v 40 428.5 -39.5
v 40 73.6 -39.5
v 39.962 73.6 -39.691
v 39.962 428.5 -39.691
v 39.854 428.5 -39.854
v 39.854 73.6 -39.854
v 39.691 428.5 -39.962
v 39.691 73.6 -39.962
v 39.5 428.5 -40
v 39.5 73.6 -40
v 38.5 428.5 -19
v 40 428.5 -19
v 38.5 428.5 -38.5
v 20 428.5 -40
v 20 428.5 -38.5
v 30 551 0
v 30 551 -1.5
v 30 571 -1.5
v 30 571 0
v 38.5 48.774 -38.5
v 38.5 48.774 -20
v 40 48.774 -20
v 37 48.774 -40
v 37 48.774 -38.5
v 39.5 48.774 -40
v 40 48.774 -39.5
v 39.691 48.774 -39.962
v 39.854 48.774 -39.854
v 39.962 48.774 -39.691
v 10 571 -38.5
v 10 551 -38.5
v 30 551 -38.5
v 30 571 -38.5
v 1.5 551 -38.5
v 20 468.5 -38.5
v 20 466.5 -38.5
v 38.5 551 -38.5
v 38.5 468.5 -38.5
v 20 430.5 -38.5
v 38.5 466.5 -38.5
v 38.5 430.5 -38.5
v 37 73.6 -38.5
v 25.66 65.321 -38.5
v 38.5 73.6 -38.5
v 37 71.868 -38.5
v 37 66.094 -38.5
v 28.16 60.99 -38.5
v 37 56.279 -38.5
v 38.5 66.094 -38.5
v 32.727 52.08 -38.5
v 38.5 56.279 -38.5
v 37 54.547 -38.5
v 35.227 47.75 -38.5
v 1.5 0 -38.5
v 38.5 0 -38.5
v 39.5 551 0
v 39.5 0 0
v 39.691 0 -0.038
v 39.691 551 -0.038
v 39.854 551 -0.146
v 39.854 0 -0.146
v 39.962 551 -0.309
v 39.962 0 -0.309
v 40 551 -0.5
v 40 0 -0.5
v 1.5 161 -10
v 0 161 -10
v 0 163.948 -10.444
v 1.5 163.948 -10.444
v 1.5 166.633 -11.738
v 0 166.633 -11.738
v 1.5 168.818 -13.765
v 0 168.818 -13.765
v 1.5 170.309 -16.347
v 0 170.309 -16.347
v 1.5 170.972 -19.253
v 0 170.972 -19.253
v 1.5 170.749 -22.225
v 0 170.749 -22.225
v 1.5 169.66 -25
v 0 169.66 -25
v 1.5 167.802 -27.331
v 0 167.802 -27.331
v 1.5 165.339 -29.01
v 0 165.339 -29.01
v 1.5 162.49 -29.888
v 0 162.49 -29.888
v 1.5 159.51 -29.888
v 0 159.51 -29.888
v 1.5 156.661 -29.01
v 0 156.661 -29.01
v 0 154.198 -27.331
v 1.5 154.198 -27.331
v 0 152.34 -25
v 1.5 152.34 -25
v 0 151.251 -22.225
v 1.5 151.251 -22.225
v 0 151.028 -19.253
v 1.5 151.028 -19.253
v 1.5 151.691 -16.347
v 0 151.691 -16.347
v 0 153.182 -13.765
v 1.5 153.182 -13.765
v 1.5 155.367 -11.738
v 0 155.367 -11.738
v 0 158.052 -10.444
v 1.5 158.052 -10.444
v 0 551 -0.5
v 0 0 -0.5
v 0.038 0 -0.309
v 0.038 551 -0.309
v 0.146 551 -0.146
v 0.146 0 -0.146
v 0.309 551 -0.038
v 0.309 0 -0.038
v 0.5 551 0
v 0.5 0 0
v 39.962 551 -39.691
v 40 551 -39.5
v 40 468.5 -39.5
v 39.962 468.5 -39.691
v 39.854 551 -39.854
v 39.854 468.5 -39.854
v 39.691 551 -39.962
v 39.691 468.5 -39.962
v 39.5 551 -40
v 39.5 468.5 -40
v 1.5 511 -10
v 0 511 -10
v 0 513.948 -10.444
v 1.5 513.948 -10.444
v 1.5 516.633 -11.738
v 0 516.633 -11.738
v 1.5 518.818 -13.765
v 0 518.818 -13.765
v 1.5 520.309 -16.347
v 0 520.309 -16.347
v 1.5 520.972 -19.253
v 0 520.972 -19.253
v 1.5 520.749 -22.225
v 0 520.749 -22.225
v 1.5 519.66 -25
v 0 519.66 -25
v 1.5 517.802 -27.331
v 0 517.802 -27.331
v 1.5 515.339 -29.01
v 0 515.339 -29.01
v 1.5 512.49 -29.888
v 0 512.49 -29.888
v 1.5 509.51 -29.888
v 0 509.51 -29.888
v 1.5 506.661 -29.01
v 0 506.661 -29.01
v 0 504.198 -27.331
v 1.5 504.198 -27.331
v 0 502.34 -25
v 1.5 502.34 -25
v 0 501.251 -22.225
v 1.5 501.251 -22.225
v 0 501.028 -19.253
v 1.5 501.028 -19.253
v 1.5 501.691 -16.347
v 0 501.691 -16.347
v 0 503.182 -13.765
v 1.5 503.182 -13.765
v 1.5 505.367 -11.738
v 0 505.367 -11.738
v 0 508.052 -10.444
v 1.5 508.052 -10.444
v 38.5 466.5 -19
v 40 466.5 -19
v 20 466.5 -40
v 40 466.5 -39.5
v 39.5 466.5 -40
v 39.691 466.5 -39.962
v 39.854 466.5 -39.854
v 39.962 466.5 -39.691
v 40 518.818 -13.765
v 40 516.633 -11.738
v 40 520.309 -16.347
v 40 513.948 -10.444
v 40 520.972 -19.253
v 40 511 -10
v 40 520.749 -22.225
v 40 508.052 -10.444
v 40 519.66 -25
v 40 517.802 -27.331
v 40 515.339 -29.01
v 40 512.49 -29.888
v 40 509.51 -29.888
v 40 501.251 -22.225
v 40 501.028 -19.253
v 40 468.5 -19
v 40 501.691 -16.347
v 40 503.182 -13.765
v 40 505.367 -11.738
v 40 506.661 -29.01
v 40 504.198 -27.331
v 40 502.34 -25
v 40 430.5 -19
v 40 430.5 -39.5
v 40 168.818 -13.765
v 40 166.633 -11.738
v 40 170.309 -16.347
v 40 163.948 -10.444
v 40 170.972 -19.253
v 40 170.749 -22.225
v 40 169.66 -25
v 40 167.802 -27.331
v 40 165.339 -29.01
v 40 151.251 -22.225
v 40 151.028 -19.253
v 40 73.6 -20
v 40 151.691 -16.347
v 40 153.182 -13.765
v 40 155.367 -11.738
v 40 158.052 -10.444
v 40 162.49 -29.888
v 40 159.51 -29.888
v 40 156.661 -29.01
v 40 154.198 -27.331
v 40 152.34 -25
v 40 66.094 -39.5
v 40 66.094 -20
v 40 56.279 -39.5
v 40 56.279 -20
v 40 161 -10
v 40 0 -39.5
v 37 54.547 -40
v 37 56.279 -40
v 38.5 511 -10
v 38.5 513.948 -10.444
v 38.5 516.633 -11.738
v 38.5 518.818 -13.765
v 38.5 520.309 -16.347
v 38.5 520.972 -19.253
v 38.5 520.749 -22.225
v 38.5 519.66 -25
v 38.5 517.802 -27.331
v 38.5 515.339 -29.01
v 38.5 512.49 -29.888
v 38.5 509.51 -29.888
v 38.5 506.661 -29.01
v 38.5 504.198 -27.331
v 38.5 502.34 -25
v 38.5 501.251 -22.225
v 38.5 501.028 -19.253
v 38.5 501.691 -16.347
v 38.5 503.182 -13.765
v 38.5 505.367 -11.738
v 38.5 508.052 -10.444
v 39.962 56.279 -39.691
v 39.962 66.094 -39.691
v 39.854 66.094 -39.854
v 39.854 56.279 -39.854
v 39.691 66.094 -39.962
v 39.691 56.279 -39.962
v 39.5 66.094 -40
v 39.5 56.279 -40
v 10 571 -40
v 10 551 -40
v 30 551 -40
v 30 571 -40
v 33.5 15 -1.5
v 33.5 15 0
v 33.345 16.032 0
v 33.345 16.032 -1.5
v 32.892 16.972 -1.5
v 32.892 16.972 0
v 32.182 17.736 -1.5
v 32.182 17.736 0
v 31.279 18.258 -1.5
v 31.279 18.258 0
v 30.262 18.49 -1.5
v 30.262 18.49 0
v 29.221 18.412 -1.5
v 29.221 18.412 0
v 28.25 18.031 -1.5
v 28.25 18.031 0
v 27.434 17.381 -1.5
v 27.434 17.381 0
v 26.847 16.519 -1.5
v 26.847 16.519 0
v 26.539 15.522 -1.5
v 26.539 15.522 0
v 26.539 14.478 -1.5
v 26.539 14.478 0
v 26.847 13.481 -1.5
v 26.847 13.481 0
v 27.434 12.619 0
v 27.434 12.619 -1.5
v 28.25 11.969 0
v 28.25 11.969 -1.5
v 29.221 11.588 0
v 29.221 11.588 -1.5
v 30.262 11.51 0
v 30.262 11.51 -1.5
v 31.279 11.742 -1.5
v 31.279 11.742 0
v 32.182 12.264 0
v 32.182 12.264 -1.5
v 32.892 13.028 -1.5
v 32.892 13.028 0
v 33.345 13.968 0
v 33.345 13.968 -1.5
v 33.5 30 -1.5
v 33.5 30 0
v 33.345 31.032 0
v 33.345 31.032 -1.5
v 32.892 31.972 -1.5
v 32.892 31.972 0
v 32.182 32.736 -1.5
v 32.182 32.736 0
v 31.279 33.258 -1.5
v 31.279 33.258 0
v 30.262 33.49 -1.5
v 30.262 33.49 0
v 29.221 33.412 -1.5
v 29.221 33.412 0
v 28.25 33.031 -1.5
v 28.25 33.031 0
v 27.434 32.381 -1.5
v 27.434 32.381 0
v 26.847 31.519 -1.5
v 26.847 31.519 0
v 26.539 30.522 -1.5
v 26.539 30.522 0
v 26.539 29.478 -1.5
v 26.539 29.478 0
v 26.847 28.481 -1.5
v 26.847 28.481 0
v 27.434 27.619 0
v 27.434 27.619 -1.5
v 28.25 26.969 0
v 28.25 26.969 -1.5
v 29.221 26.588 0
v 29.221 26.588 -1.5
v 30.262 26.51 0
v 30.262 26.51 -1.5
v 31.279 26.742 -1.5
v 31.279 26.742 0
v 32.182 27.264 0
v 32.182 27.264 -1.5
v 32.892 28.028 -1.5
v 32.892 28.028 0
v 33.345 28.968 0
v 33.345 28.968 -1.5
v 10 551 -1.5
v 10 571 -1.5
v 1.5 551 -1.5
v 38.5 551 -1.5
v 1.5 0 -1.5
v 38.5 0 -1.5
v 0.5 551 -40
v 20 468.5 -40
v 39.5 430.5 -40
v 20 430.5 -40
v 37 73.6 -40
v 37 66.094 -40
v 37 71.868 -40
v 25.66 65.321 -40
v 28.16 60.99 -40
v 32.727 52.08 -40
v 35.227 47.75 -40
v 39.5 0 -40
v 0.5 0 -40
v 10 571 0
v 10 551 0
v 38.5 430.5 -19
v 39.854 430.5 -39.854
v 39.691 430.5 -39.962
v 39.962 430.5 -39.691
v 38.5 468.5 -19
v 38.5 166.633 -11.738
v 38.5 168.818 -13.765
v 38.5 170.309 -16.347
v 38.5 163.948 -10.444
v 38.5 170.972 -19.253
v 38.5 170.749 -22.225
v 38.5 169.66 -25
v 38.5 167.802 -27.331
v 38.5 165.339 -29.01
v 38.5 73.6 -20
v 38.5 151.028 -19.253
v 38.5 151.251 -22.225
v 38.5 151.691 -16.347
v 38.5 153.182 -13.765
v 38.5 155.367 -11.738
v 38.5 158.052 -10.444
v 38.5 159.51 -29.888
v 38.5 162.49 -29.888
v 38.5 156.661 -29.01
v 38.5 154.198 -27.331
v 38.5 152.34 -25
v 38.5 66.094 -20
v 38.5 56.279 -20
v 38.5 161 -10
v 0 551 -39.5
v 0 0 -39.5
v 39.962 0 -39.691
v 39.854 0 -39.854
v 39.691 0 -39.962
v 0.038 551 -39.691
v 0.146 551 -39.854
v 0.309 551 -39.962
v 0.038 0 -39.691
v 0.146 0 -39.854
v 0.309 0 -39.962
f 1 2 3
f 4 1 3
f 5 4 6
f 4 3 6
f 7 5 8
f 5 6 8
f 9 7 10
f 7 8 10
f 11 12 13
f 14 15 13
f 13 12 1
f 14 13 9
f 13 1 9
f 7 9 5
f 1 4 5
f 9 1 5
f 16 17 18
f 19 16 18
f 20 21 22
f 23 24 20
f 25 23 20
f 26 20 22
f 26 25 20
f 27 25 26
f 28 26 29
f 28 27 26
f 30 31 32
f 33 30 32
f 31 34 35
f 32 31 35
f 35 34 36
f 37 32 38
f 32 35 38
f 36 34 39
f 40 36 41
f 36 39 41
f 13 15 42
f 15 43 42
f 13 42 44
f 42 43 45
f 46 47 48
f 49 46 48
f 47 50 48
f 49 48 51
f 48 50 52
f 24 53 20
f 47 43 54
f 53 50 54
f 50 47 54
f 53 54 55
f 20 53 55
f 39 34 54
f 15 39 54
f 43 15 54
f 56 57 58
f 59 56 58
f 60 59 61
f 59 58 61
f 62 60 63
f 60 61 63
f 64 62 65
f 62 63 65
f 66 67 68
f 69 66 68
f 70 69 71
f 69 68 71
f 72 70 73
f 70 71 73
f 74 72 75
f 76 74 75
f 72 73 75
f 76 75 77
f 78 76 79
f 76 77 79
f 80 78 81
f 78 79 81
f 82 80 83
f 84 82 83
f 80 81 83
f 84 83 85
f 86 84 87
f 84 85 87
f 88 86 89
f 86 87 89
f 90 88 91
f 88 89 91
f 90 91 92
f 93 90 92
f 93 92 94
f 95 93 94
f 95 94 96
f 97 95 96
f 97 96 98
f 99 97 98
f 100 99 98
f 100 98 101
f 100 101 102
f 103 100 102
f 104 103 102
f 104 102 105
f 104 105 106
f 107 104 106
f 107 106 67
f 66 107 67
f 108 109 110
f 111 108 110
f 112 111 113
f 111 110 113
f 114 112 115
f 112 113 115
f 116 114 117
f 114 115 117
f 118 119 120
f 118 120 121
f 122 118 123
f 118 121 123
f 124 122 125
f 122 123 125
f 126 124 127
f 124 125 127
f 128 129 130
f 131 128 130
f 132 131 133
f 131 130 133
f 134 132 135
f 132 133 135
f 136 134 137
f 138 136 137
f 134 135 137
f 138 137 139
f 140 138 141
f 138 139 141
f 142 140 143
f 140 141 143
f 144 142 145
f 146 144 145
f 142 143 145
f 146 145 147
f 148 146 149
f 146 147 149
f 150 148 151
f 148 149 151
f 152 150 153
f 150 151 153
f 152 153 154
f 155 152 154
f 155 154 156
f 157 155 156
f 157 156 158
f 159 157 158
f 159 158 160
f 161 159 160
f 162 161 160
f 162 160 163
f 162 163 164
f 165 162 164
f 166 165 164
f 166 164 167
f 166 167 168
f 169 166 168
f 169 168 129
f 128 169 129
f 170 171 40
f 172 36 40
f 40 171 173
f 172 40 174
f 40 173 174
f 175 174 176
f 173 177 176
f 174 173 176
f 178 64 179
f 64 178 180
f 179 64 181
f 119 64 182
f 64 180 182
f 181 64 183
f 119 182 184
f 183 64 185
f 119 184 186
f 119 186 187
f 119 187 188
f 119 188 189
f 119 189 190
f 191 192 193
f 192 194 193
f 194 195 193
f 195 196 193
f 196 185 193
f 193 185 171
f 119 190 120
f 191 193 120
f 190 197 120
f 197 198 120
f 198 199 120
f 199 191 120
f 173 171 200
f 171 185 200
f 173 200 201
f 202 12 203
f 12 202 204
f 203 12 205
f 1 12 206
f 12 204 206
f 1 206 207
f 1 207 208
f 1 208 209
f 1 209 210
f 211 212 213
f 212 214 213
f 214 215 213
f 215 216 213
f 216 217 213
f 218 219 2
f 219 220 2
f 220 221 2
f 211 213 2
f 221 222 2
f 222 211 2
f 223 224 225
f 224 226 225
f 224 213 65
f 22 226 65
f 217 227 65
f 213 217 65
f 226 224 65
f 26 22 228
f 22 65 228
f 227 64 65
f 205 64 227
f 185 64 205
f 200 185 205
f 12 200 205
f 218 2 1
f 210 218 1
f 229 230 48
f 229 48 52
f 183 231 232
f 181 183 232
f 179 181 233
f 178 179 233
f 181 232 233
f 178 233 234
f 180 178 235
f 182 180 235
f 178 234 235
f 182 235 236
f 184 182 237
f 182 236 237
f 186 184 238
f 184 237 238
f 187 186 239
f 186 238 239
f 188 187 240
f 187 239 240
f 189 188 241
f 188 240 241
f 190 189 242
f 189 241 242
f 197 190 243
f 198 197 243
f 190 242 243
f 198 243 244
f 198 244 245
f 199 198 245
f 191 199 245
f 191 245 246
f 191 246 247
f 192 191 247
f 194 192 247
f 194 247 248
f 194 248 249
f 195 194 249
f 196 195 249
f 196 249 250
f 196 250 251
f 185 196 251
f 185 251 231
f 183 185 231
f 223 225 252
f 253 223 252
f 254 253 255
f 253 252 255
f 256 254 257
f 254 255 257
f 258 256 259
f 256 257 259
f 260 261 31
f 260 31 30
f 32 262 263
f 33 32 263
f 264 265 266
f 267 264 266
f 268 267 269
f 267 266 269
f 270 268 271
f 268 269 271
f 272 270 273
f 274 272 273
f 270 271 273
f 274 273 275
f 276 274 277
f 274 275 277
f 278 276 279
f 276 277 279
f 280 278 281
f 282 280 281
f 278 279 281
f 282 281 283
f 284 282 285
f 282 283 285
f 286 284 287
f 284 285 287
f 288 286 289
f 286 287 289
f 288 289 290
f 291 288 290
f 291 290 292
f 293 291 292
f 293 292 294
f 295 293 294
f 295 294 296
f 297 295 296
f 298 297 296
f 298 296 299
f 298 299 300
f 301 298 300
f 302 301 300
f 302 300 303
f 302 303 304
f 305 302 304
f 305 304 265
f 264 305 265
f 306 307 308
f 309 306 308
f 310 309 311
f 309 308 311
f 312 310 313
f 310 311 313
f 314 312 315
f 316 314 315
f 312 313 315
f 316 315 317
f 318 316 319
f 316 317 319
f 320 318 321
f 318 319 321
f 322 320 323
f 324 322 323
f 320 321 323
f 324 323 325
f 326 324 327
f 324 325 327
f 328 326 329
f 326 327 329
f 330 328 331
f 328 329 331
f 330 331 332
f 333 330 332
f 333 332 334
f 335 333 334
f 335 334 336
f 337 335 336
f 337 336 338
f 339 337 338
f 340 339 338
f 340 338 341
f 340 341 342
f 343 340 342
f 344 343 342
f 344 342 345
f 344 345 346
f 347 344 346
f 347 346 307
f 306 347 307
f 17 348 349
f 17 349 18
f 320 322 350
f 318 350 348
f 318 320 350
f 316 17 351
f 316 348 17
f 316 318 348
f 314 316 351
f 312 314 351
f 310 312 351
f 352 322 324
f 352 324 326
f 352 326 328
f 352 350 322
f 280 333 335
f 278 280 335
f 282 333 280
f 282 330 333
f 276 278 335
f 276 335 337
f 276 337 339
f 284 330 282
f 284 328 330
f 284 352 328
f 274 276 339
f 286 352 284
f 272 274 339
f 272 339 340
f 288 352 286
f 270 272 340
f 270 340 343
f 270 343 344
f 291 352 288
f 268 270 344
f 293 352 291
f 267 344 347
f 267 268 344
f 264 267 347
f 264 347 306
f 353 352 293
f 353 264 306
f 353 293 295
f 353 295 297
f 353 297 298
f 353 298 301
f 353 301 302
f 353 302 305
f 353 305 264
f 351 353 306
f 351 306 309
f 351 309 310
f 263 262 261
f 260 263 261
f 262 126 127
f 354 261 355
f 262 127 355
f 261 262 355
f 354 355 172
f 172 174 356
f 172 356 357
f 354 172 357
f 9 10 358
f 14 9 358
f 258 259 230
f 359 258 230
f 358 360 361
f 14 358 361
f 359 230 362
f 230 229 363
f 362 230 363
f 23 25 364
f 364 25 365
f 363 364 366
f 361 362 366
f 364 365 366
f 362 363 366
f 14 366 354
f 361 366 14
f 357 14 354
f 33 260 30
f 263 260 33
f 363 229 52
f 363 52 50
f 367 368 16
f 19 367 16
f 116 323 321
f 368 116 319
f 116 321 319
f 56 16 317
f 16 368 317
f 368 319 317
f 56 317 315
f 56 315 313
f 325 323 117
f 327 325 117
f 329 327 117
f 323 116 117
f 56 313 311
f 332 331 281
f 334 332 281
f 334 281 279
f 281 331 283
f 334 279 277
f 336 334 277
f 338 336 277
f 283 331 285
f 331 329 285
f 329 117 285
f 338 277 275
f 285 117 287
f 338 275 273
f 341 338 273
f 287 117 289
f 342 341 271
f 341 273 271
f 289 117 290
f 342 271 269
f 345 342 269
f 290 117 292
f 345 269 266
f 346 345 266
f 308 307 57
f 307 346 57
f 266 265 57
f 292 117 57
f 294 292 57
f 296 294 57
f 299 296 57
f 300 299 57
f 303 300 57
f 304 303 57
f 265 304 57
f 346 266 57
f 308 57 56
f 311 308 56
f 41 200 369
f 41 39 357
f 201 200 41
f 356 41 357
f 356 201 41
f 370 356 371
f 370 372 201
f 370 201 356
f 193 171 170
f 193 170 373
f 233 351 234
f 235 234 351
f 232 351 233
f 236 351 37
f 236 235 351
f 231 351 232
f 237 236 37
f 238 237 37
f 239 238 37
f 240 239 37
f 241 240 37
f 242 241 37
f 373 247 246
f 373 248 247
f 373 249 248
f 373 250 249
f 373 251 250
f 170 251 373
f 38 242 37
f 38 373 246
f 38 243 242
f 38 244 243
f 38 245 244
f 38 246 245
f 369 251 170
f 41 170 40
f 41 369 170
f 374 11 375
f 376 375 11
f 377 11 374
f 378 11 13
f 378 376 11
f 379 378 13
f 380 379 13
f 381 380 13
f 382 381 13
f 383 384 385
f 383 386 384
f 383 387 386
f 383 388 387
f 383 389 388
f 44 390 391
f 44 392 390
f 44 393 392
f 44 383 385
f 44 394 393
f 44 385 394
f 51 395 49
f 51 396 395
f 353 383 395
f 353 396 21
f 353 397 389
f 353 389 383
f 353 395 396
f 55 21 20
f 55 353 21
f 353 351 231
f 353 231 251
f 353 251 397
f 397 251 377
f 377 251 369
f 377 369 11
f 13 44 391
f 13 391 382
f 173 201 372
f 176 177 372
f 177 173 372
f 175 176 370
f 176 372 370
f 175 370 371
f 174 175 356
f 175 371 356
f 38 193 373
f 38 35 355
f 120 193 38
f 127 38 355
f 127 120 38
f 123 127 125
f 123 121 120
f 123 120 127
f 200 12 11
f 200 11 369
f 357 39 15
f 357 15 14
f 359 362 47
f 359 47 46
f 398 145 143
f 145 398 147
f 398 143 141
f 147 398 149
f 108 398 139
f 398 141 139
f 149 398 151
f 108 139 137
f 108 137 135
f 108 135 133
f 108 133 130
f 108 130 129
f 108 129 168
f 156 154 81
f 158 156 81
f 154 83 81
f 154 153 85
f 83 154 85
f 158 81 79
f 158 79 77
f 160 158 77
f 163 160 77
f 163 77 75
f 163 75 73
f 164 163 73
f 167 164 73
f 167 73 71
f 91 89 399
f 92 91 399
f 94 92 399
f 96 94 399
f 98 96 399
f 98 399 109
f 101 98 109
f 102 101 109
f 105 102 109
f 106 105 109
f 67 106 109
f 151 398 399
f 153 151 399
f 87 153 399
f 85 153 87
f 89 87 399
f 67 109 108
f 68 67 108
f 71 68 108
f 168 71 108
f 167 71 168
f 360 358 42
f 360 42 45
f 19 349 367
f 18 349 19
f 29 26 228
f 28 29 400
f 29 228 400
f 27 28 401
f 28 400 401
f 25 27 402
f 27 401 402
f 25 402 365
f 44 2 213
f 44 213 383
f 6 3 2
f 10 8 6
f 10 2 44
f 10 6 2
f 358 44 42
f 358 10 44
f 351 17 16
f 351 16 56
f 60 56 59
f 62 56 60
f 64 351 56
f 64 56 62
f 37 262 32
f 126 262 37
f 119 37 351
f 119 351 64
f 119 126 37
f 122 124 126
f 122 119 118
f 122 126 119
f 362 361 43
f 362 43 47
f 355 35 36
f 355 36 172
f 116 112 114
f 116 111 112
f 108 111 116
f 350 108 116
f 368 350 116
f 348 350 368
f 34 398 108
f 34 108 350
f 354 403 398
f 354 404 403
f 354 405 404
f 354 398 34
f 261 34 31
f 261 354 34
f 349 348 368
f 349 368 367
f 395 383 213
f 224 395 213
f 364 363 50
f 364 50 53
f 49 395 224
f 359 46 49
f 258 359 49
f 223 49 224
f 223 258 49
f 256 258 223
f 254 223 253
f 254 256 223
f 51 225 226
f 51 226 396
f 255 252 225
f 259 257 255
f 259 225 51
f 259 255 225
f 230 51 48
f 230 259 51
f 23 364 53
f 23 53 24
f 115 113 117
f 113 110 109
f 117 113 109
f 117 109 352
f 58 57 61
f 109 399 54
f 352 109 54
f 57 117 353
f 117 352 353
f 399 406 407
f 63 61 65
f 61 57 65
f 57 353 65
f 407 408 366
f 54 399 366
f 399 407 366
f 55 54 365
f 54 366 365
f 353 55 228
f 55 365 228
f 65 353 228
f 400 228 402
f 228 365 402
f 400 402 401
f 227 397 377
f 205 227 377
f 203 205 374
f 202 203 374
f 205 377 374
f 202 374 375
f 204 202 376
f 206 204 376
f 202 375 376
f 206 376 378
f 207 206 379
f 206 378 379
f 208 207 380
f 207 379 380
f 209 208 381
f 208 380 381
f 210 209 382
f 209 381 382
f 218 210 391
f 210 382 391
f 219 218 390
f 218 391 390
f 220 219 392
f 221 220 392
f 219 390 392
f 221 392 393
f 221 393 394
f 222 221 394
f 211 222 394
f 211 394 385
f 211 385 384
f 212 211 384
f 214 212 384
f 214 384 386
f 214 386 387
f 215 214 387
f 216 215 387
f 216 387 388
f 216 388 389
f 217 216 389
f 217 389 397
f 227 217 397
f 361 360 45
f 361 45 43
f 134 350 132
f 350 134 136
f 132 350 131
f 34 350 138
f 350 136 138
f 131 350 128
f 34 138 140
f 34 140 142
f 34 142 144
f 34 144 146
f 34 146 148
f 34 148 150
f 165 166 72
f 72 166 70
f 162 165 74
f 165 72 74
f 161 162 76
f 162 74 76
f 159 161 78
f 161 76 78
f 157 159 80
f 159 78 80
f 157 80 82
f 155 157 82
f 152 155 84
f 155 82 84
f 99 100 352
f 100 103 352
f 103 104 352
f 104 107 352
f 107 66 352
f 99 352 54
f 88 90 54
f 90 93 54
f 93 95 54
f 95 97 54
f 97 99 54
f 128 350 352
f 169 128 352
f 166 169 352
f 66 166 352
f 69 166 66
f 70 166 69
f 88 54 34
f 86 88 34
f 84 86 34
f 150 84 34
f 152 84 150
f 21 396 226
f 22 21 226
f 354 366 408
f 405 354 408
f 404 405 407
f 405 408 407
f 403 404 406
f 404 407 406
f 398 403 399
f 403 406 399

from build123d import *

# Parameters (mm, degrees)
SKETCH1_W           = 37
SKETCH1_H           = 37
BOSS_EXTRUDE1_DEPTH = 571
SKETCH2_W           = 10
SKETCH2_H           = 20
CUT_EXTRUDE1_DEPTH  = 40
SKETCH3_W           = 21
SKETCH3_H           = 2
CUT_EXTRUDE2_DEPTH  = 20
CUT_EXTRUDE3_DEPTH  = 20
SKETCH5_R           = 3.5
CUT_EXTRUDE4_DEPTH  = 10
SKETCH6_R           = 10
CUT_EXTRUDE5_DEPTH  = 574.795259653


with BuildPart() as part:
    # Sketch1 → Boss-Extrude1 (new body)
    with BuildSketch(Plane(origin=(0, 0, 0), x_dir=(1, 0, 0), z_dir=(0, 1, 0))):
        with BuildLine():
            Line((0.5, 0), (39.5, 0))
            ThreePointArc((39.5, 0), (39.853553391, 0.146446609), (40, 0.5))
            Line((40, 0.5), (40, 39.5))
            ThreePointArc((40, 39.5), (39.853553391, 39.853553391), (39.5, 40))
            Line((39.5, 40), (0.5, 40))
            ThreePointArc((0.5, 40), (0.146446609, 39.853553391), (0, 39.5))
            Line((0, 39.5), (0, 0.5))
            ThreePointArc((0, 0.5), (0.146446609, 0.146446609), (0.5, 0))
        make_face()
        with Locations((20, 20)):
            Rectangle(SKETCH1_W, SKETCH1_H, mode=Mode.SUBTRACT)
    extrude(amount=BOSS_EXTRUDE1_DEPTH)

    # Sketch2 → Cut-Extrude1 (cut)
    with BuildSketch(Plane.XY.offset(-40)):
        with Locations((35, 561)):
            Rectangle(SKETCH2_W, SKETCH2_H)
        with Locations((5, 561)):
            Rectangle(SKETCH2_W, SKETCH2_H)
    extrude(amount=CUT_EXTRUDE1_DEPTH, mode=Mode.SUBTRACT)

    # Sketch3 → Cut-Extrude2 (cut)
    with BuildSketch(Plane(origin=(40, 0, 0), x_dir=(0, 0, -1), z_dir=(1, 0, 0))):
        with Locations((29.5, 467.5)):
            Rectangle(SKETCH3_W, SKETCH3_H)
        with Locations((29.5, 429.5)):
            Rectangle(SKETCH3_W, SKETCH3_H)
    extrude(amount=-CUT_EXTRUDE2_DEPTH, mode=Mode.SUBTRACT)

    # Sketch4 → Cut-Extrude3 (cut)
    with BuildSketch(Plane(origin=(0, 0, -40), x_dir=(-1, 0, 0), z_dir=(0, 0, -1))):
        Polygon((-40, 73.59987752), (-37, 73.59987752), (-37, 71.867826713), (-25.659711467, 65.320508076), (-28.159711467, 60.990381057), (-37, 66.094324021), (-40, 66.094324021), align=None)
        Polygon((-40, 56.279369445), (-37, 56.279369445), (-37, 54.547318637), (-32.726698765, 52.080127019), (-35.226698765, 47.75), (-37, 48.773815945), (-40, 48.773815945), align=None)
    extrude(amount=-CUT_EXTRUDE3_DEPTH, mode=Mode.SUBTRACT)

    # Sketch5 → Cut-Extrude4 (cut)
    with BuildSketch(Plane.XY):
        with Locations((30, 15)):
            Circle(SKETCH5_R)
        with Locations((30, 30)):
            Circle(SKETCH5_R)
    extrude(amount=-CUT_EXTRUDE4_DEPTH, mode=Mode.SUBTRACT)

    # Sketch6 → Cut-Extrude5 (cut, through all)
    with BuildSketch(Plane.ZY):
        with Locations((-20, 511)):
            Circle(SKETCH6_R)
        with Locations((-20, 161)):
            Circle(SKETCH6_R)
    extrude(amount=-CUT_EXTRUDE5_DEPTH, mode=Mode.SUBTRACT)


solid = part.part
